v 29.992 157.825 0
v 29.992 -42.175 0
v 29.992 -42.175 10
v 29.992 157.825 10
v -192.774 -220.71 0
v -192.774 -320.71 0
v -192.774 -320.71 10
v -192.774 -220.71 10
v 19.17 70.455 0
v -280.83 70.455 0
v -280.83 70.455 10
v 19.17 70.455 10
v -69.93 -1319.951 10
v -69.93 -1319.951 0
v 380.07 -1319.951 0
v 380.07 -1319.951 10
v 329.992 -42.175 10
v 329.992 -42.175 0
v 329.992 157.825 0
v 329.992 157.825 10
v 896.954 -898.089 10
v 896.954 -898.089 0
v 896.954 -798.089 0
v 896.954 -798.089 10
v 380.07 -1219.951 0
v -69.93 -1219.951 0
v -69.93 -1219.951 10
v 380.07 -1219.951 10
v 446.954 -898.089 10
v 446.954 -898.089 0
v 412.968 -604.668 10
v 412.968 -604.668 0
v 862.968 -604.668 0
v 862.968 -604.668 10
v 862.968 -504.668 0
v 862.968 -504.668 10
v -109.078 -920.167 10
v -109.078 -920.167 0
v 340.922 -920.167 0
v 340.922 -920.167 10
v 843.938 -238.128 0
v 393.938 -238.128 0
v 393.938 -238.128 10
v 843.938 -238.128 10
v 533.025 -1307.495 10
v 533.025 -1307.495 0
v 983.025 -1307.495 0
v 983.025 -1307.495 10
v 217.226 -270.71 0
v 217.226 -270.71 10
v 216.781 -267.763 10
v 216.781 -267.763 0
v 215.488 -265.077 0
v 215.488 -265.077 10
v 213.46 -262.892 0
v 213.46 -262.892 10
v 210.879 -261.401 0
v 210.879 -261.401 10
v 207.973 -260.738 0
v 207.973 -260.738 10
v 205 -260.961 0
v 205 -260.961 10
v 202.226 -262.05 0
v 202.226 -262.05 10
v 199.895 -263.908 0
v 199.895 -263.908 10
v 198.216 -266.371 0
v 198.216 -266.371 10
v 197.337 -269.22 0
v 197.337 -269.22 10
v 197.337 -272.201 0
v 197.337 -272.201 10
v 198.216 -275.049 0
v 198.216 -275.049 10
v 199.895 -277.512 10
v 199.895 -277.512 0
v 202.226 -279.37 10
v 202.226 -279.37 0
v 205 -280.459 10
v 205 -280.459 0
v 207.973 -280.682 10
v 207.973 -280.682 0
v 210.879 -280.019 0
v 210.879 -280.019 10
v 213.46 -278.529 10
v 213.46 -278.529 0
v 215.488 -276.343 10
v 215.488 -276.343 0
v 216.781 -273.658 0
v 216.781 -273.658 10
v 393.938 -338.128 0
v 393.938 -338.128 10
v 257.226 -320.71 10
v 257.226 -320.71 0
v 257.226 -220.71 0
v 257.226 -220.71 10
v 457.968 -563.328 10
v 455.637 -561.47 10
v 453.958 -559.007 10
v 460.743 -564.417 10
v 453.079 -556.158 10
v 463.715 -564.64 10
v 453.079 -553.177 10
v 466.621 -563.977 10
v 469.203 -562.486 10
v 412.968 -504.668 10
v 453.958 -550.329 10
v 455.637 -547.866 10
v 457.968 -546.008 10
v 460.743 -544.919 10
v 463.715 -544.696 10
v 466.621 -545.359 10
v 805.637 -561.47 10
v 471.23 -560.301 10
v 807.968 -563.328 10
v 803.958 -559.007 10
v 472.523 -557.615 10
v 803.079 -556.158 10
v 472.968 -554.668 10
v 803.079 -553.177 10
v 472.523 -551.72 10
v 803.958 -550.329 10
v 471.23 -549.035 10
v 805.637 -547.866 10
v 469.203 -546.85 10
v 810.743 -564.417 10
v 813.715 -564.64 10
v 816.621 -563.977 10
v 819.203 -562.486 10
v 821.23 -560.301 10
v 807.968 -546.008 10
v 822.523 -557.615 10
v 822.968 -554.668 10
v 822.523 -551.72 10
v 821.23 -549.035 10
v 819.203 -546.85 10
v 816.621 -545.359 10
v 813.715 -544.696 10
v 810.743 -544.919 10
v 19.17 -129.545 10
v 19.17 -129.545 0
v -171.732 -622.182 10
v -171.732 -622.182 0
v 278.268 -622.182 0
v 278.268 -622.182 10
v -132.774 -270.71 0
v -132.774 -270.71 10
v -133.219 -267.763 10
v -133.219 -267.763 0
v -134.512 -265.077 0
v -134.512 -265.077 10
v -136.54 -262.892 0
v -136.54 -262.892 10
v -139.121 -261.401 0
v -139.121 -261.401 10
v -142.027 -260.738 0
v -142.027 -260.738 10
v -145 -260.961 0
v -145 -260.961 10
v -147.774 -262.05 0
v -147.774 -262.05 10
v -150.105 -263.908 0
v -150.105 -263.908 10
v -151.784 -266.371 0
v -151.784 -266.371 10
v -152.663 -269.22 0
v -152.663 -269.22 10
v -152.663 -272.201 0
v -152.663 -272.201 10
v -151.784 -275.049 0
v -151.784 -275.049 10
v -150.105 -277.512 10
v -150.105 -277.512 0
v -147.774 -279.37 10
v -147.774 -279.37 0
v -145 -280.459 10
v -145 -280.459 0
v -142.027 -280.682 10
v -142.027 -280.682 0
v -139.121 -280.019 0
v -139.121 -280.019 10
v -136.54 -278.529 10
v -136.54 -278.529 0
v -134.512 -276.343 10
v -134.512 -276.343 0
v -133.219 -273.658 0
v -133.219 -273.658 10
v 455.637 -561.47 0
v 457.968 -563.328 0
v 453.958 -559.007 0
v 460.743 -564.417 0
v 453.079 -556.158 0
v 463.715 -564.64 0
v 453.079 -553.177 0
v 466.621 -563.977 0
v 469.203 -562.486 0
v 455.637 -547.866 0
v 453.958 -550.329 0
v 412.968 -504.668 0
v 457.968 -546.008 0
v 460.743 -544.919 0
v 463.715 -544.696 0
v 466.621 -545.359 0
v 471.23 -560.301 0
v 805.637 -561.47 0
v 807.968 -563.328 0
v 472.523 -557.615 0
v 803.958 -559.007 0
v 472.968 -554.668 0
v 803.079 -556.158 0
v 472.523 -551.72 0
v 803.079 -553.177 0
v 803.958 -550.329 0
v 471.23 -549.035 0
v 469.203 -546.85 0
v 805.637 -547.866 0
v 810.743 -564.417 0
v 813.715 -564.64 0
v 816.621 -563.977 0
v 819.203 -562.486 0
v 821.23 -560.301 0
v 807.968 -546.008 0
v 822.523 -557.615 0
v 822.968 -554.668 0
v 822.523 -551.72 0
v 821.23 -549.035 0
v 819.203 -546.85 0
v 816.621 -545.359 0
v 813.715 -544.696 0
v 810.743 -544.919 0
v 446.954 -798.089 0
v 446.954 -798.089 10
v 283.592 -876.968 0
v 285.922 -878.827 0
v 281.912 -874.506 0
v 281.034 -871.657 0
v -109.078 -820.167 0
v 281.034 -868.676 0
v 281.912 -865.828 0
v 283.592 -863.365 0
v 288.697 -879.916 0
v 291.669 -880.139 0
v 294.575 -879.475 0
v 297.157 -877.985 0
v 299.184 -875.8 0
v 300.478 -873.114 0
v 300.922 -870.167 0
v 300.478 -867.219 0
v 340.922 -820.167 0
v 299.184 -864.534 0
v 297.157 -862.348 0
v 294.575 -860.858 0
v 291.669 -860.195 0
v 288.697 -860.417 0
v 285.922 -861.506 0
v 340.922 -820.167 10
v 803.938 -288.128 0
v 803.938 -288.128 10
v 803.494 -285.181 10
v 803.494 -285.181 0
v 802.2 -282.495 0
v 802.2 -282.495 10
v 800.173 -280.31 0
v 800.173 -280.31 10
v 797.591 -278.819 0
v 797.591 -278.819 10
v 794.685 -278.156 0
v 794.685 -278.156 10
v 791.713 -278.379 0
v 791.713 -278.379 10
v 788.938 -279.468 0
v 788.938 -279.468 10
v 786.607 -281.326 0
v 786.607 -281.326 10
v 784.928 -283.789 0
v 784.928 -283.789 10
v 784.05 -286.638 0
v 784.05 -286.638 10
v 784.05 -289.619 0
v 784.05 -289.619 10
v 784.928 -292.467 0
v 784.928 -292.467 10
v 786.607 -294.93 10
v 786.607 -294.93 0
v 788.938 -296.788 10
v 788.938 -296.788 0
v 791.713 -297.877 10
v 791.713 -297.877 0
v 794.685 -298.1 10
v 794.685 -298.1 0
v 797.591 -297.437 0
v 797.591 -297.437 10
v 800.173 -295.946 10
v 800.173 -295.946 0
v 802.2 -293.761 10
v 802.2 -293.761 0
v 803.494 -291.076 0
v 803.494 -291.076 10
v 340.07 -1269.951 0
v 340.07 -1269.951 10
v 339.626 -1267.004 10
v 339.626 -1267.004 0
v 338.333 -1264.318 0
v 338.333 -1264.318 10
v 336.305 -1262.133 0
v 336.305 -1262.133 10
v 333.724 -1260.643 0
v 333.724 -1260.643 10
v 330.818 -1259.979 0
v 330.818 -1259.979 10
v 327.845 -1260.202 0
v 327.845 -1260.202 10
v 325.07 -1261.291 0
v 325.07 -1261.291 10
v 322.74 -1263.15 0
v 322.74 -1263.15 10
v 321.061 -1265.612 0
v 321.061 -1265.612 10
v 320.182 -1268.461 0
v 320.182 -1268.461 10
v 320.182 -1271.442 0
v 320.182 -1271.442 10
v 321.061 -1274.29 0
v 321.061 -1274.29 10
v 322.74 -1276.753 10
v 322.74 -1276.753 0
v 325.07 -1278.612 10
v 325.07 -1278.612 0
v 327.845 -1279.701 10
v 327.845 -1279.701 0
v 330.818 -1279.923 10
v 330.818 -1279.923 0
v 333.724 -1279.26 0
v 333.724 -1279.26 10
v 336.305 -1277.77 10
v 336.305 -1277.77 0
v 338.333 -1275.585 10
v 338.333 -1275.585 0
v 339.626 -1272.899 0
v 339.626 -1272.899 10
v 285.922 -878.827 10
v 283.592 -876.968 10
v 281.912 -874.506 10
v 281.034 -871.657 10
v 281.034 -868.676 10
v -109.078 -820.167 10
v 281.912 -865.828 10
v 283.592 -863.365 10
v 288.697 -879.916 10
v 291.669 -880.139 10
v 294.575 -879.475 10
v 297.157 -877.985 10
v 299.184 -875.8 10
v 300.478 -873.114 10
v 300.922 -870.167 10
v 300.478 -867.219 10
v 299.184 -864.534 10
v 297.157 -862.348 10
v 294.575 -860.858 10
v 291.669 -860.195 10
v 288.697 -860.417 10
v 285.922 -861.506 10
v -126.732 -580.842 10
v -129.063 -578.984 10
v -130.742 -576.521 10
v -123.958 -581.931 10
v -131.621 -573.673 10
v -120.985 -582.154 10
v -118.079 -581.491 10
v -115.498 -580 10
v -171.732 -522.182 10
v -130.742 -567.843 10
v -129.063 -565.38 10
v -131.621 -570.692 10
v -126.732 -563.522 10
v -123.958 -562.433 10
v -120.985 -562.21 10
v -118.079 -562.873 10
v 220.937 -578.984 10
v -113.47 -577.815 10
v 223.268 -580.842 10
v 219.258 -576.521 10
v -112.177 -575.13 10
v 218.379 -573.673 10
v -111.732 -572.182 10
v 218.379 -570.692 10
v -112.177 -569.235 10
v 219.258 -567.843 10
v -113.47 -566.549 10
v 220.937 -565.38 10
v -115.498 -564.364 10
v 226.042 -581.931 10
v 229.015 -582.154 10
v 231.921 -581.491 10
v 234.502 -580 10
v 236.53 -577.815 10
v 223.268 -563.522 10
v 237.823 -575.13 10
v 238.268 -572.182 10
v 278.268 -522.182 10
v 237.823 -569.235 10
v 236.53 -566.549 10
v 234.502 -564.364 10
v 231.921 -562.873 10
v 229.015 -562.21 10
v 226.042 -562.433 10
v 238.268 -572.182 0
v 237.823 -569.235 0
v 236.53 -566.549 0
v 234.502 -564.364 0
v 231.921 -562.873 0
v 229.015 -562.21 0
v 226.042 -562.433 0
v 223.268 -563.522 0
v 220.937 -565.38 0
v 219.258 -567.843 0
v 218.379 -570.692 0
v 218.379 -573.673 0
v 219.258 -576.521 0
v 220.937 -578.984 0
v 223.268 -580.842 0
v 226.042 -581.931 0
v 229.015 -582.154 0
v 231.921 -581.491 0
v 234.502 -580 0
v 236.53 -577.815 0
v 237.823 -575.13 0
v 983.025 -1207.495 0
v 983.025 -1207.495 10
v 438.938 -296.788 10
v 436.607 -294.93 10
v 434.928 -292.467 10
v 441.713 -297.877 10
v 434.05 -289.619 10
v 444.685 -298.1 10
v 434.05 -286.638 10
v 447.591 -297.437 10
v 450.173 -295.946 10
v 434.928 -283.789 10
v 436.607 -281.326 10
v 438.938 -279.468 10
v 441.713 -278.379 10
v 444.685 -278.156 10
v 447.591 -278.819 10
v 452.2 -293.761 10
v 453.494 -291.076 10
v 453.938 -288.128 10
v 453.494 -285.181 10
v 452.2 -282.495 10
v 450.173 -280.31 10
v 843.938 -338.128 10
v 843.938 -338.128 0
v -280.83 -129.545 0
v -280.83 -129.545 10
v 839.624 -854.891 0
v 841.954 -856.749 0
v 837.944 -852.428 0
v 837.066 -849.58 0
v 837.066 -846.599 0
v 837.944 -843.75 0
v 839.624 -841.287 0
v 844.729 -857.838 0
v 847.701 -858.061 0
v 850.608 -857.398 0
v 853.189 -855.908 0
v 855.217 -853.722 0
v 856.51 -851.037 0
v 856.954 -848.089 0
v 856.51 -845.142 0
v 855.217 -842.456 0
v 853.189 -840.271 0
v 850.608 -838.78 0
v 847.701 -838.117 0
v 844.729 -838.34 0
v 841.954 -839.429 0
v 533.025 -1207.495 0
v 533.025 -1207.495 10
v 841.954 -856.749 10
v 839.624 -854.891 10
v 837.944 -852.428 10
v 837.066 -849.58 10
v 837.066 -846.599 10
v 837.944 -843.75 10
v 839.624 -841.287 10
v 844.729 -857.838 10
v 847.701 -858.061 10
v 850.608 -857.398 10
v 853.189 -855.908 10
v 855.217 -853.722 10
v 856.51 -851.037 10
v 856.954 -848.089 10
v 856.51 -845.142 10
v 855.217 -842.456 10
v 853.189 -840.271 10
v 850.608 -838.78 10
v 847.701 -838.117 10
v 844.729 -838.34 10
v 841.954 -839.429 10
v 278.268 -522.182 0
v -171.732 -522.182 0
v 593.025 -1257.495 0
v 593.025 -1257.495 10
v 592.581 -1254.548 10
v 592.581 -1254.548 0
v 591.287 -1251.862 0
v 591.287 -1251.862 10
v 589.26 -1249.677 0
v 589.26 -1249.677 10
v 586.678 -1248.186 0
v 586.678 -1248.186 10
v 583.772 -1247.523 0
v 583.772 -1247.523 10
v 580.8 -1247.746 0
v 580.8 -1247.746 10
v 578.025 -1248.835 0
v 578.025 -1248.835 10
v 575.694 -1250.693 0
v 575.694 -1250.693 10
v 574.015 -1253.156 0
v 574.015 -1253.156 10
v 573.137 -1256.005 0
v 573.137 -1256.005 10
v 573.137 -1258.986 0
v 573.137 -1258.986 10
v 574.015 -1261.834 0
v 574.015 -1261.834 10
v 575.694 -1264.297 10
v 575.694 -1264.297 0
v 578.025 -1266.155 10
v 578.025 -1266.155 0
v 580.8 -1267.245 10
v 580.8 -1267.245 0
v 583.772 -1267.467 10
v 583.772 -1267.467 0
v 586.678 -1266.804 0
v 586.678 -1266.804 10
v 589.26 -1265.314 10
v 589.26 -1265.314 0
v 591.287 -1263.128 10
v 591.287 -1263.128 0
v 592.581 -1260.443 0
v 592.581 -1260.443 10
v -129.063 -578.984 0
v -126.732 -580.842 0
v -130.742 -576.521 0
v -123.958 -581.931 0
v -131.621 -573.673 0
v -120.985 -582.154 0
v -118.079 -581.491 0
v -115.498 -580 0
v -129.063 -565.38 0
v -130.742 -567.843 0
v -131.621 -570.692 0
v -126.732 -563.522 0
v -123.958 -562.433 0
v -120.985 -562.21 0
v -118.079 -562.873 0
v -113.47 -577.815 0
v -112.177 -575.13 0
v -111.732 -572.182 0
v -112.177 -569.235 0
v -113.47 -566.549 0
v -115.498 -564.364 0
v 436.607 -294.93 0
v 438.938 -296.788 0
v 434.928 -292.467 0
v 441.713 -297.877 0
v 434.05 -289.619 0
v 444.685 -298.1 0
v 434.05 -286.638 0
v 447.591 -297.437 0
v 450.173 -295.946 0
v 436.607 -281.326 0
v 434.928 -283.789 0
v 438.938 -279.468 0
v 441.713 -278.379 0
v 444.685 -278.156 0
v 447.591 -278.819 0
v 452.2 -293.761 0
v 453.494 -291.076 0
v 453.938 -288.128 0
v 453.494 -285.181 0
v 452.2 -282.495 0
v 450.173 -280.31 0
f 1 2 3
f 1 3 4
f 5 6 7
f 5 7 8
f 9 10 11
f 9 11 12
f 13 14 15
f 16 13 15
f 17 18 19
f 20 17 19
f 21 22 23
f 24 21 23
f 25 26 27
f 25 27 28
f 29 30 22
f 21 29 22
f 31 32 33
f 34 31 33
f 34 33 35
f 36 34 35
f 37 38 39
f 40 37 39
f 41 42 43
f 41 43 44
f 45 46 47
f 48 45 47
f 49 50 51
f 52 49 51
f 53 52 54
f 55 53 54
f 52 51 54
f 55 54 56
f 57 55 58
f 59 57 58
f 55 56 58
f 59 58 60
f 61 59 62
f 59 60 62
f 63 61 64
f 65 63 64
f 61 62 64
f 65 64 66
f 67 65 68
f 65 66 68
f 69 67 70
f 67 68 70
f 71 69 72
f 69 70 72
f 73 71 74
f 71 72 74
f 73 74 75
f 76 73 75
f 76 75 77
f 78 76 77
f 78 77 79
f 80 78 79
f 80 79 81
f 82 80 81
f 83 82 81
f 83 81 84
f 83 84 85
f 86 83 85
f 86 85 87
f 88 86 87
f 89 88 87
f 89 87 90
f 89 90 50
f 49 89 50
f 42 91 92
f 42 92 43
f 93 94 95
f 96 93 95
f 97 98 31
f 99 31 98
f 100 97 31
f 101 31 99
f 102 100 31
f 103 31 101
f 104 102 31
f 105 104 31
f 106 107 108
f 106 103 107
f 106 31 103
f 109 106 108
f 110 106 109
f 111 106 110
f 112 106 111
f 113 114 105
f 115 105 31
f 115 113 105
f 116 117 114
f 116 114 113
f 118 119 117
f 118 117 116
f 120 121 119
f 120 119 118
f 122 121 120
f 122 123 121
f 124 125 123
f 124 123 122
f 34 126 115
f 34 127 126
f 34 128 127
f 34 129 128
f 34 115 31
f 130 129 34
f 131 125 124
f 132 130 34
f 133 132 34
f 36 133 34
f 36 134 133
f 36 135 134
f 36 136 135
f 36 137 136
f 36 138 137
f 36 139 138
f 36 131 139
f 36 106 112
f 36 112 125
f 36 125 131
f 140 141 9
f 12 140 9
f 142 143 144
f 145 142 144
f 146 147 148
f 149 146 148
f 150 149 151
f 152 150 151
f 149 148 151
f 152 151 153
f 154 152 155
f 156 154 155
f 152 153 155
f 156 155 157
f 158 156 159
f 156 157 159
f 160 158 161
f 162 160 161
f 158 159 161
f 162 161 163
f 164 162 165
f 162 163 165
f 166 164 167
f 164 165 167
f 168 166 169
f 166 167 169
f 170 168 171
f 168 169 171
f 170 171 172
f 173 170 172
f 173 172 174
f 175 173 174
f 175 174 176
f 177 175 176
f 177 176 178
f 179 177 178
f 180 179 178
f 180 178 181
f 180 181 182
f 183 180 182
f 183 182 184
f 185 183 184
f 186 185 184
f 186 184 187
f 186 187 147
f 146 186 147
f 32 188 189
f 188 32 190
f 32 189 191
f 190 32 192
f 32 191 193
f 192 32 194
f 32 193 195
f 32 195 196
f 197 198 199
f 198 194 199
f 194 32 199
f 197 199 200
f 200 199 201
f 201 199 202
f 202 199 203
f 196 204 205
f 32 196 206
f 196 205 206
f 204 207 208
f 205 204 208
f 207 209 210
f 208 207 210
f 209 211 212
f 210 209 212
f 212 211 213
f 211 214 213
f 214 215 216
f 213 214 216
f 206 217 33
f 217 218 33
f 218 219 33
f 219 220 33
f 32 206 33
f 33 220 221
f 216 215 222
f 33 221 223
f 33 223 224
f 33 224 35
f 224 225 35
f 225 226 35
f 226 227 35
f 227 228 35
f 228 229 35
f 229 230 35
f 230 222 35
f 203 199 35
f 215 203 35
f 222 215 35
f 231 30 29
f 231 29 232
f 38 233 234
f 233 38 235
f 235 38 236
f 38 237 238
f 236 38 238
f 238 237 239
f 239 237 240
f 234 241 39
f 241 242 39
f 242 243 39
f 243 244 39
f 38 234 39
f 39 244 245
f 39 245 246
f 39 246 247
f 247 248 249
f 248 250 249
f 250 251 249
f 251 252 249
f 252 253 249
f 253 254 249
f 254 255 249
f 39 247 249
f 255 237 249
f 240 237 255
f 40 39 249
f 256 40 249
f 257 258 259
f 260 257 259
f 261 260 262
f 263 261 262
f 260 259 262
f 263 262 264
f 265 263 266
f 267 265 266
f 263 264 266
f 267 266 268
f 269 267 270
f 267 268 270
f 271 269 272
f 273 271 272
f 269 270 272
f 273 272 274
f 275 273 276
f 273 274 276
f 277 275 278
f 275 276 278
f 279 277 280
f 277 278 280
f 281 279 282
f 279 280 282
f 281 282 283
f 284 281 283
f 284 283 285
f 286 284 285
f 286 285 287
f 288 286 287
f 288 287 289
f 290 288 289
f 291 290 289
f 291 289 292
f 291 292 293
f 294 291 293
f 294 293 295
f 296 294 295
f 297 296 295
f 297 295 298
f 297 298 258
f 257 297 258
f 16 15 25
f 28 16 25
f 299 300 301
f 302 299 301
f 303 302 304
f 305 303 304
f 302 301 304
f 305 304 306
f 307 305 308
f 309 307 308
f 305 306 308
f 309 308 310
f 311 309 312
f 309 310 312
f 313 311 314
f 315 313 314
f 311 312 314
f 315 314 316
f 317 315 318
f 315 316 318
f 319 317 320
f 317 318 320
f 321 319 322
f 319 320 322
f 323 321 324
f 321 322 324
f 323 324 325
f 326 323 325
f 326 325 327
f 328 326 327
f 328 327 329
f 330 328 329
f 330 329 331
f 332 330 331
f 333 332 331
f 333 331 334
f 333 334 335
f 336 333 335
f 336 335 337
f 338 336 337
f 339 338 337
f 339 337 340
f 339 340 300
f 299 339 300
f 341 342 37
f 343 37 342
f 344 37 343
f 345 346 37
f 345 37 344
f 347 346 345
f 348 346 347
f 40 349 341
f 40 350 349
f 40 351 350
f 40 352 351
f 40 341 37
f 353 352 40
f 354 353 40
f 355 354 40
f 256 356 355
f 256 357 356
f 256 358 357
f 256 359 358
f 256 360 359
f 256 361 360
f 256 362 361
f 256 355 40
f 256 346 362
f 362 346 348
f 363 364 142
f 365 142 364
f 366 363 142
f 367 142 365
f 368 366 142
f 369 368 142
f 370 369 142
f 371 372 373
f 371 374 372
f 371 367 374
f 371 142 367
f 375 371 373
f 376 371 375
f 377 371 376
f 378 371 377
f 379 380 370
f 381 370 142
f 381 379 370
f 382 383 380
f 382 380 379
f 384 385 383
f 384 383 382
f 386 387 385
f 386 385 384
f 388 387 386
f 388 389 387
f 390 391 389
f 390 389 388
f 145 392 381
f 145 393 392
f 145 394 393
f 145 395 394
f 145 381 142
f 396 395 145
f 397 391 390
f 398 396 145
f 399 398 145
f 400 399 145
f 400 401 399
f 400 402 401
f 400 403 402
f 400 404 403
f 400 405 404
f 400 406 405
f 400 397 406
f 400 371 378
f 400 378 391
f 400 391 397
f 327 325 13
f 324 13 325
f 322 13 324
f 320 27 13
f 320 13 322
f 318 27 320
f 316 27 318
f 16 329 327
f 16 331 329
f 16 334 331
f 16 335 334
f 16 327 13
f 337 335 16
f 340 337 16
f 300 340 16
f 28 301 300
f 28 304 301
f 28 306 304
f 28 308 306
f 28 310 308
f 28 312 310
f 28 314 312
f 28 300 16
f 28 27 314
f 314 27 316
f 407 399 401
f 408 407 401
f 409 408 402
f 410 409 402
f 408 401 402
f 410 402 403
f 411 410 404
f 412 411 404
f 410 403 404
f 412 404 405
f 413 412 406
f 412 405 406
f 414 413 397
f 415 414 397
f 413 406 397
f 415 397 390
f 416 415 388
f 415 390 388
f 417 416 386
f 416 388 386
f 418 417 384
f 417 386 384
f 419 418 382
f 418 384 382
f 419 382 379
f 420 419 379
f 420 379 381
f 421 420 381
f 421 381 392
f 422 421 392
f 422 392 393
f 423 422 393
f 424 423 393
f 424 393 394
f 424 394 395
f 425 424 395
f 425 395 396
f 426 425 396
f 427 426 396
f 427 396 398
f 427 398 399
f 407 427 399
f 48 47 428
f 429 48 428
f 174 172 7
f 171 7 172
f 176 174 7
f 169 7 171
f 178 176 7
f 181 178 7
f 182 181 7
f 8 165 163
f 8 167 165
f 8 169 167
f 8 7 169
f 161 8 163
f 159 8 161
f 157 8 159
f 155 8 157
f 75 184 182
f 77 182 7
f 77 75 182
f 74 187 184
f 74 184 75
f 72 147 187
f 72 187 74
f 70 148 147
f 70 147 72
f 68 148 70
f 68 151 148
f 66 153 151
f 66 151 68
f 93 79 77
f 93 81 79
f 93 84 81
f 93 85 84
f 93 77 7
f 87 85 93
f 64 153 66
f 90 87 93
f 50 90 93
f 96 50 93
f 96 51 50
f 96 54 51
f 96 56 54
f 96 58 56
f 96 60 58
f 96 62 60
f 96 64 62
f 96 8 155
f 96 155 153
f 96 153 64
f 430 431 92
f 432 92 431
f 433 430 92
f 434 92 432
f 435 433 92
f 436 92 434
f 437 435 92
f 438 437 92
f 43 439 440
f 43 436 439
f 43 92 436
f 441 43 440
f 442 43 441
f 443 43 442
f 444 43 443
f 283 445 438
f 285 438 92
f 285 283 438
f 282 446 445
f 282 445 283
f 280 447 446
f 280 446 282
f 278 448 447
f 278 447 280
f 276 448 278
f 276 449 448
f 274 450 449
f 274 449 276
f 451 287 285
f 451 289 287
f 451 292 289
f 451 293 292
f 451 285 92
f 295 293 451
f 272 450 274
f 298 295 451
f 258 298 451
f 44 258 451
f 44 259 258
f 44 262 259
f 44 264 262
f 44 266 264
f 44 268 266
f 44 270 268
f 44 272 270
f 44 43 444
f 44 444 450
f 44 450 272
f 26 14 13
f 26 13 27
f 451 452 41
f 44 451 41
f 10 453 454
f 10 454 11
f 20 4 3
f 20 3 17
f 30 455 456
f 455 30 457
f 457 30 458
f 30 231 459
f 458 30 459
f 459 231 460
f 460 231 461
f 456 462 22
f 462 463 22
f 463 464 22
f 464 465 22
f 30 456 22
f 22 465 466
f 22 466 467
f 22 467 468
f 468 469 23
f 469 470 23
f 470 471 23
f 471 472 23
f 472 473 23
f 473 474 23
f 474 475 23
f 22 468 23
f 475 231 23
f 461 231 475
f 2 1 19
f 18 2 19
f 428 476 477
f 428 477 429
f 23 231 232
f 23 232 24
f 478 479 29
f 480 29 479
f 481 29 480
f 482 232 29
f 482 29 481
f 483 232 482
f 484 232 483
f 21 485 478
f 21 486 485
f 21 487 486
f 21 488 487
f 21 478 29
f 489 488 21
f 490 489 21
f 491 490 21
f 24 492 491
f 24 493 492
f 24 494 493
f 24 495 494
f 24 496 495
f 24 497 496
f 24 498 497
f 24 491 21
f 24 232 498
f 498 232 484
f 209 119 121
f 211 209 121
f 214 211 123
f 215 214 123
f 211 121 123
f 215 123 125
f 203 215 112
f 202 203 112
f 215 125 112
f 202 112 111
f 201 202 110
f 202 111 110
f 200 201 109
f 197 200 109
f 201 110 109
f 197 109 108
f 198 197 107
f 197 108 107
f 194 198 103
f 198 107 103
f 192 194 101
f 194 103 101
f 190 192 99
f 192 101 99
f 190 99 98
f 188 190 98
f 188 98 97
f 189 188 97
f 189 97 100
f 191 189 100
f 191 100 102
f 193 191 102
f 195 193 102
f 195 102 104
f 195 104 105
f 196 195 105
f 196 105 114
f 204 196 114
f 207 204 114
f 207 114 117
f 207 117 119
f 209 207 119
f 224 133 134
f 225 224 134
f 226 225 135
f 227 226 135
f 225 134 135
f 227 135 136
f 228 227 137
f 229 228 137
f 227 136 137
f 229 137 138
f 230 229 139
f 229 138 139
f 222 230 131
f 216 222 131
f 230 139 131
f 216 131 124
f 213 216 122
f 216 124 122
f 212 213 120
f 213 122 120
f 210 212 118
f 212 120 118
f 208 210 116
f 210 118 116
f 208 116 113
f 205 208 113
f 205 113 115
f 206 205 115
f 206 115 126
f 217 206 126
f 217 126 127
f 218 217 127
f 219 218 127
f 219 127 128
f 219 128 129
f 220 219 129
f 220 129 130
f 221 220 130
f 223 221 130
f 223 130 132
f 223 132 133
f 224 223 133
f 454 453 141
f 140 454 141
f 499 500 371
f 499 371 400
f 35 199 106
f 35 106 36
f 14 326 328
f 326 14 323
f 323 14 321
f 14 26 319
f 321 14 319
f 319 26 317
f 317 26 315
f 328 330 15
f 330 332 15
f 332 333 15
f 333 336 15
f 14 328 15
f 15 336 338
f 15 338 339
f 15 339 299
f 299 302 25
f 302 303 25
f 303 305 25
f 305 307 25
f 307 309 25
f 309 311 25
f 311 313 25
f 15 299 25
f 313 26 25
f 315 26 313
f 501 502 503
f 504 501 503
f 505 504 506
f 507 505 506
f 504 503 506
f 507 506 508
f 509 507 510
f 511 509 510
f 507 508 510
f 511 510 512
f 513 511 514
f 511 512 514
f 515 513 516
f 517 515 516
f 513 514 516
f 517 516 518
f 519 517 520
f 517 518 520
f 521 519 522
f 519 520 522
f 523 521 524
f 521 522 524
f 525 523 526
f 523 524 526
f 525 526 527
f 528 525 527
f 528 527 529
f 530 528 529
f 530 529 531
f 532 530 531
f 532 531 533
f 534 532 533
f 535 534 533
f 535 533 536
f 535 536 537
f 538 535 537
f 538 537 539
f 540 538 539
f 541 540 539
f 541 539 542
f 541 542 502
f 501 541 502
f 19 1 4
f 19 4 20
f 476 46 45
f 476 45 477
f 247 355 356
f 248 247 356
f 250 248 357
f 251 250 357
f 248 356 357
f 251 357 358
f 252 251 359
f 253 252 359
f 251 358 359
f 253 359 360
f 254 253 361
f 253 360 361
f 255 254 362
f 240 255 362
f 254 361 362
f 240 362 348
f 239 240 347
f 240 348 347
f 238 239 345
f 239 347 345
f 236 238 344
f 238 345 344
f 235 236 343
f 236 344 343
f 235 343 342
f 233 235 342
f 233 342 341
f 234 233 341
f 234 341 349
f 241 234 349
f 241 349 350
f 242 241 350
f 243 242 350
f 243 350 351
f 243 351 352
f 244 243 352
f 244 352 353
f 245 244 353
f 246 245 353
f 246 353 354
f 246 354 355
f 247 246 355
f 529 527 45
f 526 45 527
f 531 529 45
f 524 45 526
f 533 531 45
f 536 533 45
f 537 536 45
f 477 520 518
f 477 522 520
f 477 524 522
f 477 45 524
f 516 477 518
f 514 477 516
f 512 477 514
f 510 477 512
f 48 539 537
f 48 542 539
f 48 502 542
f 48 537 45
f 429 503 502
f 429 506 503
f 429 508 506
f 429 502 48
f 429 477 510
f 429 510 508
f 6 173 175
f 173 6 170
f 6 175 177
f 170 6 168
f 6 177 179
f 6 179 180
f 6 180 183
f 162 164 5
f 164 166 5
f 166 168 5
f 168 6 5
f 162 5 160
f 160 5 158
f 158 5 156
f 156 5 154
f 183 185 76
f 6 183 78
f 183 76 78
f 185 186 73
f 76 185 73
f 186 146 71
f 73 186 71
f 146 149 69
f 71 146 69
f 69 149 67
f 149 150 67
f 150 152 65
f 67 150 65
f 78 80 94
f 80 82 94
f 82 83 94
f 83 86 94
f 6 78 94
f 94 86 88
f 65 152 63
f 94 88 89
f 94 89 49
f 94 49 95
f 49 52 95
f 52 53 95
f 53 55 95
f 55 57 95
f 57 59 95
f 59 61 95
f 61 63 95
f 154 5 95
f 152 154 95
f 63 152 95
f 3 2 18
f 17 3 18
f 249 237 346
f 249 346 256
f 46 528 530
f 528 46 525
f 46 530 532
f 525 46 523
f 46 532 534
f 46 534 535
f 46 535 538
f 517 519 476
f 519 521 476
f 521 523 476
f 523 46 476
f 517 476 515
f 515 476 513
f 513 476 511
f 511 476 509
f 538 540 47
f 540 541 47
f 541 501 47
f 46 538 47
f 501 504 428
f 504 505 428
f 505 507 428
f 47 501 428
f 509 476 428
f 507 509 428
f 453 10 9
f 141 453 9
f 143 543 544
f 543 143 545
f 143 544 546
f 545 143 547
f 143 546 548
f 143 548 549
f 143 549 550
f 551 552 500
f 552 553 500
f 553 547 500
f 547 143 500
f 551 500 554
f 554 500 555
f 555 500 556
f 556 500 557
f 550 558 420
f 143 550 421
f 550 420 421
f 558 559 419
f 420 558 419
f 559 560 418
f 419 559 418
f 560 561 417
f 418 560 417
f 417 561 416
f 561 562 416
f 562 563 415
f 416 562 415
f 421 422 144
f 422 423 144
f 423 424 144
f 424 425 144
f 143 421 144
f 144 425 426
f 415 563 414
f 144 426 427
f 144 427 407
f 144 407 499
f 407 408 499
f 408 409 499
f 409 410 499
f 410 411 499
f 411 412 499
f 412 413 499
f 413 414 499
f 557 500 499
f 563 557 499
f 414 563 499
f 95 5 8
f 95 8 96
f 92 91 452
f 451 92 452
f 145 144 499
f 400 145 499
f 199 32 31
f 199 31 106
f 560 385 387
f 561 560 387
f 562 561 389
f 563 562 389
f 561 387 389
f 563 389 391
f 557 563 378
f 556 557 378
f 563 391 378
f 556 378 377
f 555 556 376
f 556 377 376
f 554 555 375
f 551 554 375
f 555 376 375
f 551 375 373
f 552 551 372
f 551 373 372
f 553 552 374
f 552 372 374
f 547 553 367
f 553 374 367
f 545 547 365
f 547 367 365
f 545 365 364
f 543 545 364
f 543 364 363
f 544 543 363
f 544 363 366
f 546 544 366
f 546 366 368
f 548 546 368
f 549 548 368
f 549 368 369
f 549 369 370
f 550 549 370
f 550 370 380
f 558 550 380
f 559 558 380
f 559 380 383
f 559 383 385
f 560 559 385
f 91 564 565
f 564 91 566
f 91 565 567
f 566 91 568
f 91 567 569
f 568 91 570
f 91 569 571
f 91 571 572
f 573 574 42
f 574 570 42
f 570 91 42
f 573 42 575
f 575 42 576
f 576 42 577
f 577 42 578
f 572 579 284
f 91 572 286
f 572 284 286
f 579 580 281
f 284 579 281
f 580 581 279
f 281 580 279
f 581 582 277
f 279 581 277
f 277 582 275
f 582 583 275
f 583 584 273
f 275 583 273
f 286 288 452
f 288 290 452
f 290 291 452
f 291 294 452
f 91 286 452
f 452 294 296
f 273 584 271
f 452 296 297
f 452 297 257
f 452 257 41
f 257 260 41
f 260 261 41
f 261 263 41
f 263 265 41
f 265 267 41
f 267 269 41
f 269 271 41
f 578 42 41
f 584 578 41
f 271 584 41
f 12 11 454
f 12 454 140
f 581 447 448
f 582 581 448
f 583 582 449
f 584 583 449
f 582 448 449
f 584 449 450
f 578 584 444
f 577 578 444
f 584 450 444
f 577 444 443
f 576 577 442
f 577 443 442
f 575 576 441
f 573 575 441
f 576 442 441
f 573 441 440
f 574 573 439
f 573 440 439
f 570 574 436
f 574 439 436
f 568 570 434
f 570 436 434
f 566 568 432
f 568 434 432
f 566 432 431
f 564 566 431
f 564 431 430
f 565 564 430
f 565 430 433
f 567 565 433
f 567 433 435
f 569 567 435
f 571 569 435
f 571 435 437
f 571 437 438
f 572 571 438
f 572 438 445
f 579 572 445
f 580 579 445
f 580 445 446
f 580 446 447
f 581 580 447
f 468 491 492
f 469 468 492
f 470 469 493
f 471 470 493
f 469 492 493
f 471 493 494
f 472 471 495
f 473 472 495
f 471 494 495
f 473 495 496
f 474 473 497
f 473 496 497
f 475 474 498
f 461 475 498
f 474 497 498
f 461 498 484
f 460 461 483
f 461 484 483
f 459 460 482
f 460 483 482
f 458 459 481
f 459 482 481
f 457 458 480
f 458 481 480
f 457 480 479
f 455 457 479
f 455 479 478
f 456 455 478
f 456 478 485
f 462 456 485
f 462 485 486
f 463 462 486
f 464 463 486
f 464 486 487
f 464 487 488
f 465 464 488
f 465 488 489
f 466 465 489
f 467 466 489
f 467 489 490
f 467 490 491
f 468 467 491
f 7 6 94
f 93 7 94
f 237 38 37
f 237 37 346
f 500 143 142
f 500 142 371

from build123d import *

# Parameters (mm, degrees)
F0_W      = 300
F0_H      = 200
F1_DEPTH  = 10
F2_W      = 300
F2_H      = 200
F3_DEPTH  = 10
F4_W      = 450
F4_H      = 100
F5_DEPTH  = 10
F6_W      = 450
F6_H      = 100
F7_DEPTH  = 10
F8_W      = 450
F8_H      = 100
F9_DEPTH  = 10
F10_W     = 450
F10_H     = 100
F11_DEPTH = 10
F12_W     = 450
F12_H     = 100
F13_DEPTH = 10
F14_W     = 450
F14_H     = 100
F15_DEPTH = 10
F16_W     = 450
F16_H     = 100
F17_DEPTH = 10
F18_W     = 450
F18_H     = 100
F19_DEPTH = 10
F20_R     = 10
F21_DEPTH = 25
F22_R     = 10
F23_DEPTH = 25
F24_R     = 10
F25_DEPTH = 25
F26_R     = 10
F27_DEPTH = 25
F28_R     = 10
F29_DEPTH = 25
F30_R     = 10
F31_DEPTH = 25
F32_R     = 10
F33_DEPTH = 25
F34_R     = 10
F35_DEPTH = 25
F36_R     = 10
F37_DEPTH = 25
F38_R     = 10
F39_DEPTH = 25
F40_R     = 10
F41_DEPTH = 25
F42_DEPTH = 25
F43_R     = 10
F44_DEPTH = 25


with BuildPart() as f1:
    # F0 (on Top) → F1 (new body)
    with BuildSketch(Plane.XY):
        with Locations((-130.829999893, -29.5446265955)):
            Rectangle(F0_W, F0_H)
    extrude(amount=F1_DEPTH)

    # F40 (on face) → F42 (cut)
    with BuildSketch(Plane.XY.offset(10)):
        with Locations((290.9220486879, -870.1667009159)):
            Circle(F40_R)
    extrude(amount=-F42_DEPTH, mode=Mode.SUBTRACT)


with BuildPart() as f3:
    # F2 (on Top) → F3 (new body)
    with BuildSketch(Plane.XY):
        with Locations((179.9916743715, 57.8253399581)):
            Rectangle(F2_W, F2_H)
    extrude(amount=F3_DEPTH)


with BuildPart() as f5:
    # F4 (on Top) → F5 (new body)
    with BuildSketch(Plane.XY):
        with Locations((32.2255682353, -270.7102075219)):
            Rectangle(F4_W, F4_H)
    extrude(amount=F5_DEPTH)

    # F20 (on face) → F21 (cut)
    with BuildSketch(Plane.XY.offset(10)):
        with Locations((-142.7744317647, -270.7102075219)):
            Circle(F20_R)
    extrude(amount=-F21_DEPTH, mode=Mode.SUBTRACT)

    # F28 (on face) → F29 (cut)
    with BuildSketch(Plane.XY.offset(10)):
        with Locations((207.2255682353, -270.7102075219)):
            Circle(F28_R)
    extrude(amount=-F29_DEPTH, mode=Mode.SUBTRACT)


with BuildPart() as f7:
    # F6 (on Top) → F7 (new body)
    with BuildSketch(Plane.XY):
        with Locations((53.2675758004, -572.1820970584)):
            Rectangle(F6_W, F6_H)
    extrude(amount=F7_DEPTH)

    # F22 (on face) → F23 (cut)
    with BuildSketch(Plane.XY.offset(10)):
        with Locations((-121.7324241996, -572.1820970584)):
            Circle(F22_R)
    extrude(amount=-F23_DEPTH, mode=Mode.SUBTRACT)

    # F34 (on face) → F35 (cut)
    with BuildSketch(Plane.XY.offset(10)):
        with Locations((228.2675758004, -572.1820970584)):
            Circle(F34_R)
    extrude(amount=-F35_DEPTH, mode=Mode.SUBTRACT)


with BuildPart() as f9:
    # F8 (on Top) → F9 (new body)
    with BuildSketch(Plane.XY):
        with Locations((618.9378350973, -288.1281608172)):
            Rectangle(F8_W, F8_H)
    extrude(amount=F9_DEPTH)

    # F30 (on face) → F31 (cut)
    with BuildSketch(Plane.XY.offset(10)):
        with Locations((443.9378350973, -288.1281608172)):
            Circle(F30_R)
    extrude(amount=-F31_DEPTH, mode=Mode.SUBTRACT)

    # F32 (on face) → F33 (cut)
    with BuildSketch(Plane.XY.offset(10)):
        with Locations((793.9378350973, -288.1281608172)):
            Circle(F32_R)
    extrude(amount=-F33_DEPTH, mode=Mode.SUBTRACT)


with BuildPart() as f11:
    # F10 (on Top) → F11 (new body)
    with BuildSketch(Plane.XY):
        with Locations((637.9677504301, -554.6679184214)):
            Rectangle(F10_W, F10_H)
    extrude(amount=F11_DEPTH)

    # F36 (on face) → F37 (cut)
    with BuildSketch(Plane.XY.offset(10)):
        with Locations((462.9677504301, -554.6679184214)):
            Circle(F36_R)
    extrude(amount=-F37_DEPTH, mode=Mode.SUBTRACT)

    # F38 (on face) → F39 (cut)
    with BuildSketch(Plane.XY.offset(10)):
        with Locations((812.9677504301, -554.6679184214)):
            Circle(F38_R)
    extrude(amount=-F39_DEPTH, mode=Mode.SUBTRACT)


with BuildPart() as f13:
    # F12 (on Top) → F13 (new body)
    with BuildSketch(Plane.XY):
        with Locations((115.9220486879, -870.1667009159)):
            Rectangle(F12_W, F12_H)
    extrude(amount=F13_DEPTH)

    # F40 (on face) → F41 (cut)
    with BuildSketch(Plane.XY.offset(10)):
        with Locations((290.9220486879, -870.1667009159)):
            Circle(F40_R)
    extrude(amount=-F41_DEPTH, mode=Mode.SUBTRACT)


with BuildPart() as f15:
    # F14 (on Top) → F15 (new body)
    with BuildSketch(Plane.XY):
        with Locations((671.9541549683, -848.0891854066)):
            Rectangle(F14_W, F14_H)
    extrude(amount=F15_DEPTH)

    # F26 (on face) → F27 (cut)
    with BuildSketch(Plane.XY.offset(10)):
        with Locations((846.9541549683, -848.0891854066)):
            Circle(F26_R)
    extrude(amount=-F27_DEPTH, mode=Mode.SUBTRACT)


with BuildPart() as f17:
    # F16 (on Top) → F17 (new body)
    with BuildSketch(Plane.XY):
        with Locations((155.070245266, -1269.9513289308)):
            Rectangle(F16_W, F16_H)
    extrude(amount=F17_DEPTH)

    # F24 (on face) → F25 (cut)
    with BuildSketch(Plane.XY.offset(10)):
        with Locations((330.070245266, -1269.9513289308)):
            Circle(F24_R)
    extrude(amount=-F25_DEPTH, mode=Mode.SUBTRACT)


with BuildPart() as f19:
    # F18 (on Top) → F19 (new body)
    with BuildSketch(Plane.XY):
        with Locations((758.0249905586, -1257.4952262085)):
            Rectangle(F18_W, F18_H)
    extrude(amount=F19_DEPTH)

    # F43 (on face) → F44 (cut)
    with BuildSketch(Plane.XY.offset(10)):
        with Locations((583.0249905586, -1257.4952262085)):
            Circle(F43_R)
    extrude(amount=-F44_DEPTH, mode=Mode.SUBTRACT)


solid = Compound([f1.part, f3.part, f5.part, f7.part, f9.part, f11.part, f13.part, f15.part, f17.part, f19.part])
